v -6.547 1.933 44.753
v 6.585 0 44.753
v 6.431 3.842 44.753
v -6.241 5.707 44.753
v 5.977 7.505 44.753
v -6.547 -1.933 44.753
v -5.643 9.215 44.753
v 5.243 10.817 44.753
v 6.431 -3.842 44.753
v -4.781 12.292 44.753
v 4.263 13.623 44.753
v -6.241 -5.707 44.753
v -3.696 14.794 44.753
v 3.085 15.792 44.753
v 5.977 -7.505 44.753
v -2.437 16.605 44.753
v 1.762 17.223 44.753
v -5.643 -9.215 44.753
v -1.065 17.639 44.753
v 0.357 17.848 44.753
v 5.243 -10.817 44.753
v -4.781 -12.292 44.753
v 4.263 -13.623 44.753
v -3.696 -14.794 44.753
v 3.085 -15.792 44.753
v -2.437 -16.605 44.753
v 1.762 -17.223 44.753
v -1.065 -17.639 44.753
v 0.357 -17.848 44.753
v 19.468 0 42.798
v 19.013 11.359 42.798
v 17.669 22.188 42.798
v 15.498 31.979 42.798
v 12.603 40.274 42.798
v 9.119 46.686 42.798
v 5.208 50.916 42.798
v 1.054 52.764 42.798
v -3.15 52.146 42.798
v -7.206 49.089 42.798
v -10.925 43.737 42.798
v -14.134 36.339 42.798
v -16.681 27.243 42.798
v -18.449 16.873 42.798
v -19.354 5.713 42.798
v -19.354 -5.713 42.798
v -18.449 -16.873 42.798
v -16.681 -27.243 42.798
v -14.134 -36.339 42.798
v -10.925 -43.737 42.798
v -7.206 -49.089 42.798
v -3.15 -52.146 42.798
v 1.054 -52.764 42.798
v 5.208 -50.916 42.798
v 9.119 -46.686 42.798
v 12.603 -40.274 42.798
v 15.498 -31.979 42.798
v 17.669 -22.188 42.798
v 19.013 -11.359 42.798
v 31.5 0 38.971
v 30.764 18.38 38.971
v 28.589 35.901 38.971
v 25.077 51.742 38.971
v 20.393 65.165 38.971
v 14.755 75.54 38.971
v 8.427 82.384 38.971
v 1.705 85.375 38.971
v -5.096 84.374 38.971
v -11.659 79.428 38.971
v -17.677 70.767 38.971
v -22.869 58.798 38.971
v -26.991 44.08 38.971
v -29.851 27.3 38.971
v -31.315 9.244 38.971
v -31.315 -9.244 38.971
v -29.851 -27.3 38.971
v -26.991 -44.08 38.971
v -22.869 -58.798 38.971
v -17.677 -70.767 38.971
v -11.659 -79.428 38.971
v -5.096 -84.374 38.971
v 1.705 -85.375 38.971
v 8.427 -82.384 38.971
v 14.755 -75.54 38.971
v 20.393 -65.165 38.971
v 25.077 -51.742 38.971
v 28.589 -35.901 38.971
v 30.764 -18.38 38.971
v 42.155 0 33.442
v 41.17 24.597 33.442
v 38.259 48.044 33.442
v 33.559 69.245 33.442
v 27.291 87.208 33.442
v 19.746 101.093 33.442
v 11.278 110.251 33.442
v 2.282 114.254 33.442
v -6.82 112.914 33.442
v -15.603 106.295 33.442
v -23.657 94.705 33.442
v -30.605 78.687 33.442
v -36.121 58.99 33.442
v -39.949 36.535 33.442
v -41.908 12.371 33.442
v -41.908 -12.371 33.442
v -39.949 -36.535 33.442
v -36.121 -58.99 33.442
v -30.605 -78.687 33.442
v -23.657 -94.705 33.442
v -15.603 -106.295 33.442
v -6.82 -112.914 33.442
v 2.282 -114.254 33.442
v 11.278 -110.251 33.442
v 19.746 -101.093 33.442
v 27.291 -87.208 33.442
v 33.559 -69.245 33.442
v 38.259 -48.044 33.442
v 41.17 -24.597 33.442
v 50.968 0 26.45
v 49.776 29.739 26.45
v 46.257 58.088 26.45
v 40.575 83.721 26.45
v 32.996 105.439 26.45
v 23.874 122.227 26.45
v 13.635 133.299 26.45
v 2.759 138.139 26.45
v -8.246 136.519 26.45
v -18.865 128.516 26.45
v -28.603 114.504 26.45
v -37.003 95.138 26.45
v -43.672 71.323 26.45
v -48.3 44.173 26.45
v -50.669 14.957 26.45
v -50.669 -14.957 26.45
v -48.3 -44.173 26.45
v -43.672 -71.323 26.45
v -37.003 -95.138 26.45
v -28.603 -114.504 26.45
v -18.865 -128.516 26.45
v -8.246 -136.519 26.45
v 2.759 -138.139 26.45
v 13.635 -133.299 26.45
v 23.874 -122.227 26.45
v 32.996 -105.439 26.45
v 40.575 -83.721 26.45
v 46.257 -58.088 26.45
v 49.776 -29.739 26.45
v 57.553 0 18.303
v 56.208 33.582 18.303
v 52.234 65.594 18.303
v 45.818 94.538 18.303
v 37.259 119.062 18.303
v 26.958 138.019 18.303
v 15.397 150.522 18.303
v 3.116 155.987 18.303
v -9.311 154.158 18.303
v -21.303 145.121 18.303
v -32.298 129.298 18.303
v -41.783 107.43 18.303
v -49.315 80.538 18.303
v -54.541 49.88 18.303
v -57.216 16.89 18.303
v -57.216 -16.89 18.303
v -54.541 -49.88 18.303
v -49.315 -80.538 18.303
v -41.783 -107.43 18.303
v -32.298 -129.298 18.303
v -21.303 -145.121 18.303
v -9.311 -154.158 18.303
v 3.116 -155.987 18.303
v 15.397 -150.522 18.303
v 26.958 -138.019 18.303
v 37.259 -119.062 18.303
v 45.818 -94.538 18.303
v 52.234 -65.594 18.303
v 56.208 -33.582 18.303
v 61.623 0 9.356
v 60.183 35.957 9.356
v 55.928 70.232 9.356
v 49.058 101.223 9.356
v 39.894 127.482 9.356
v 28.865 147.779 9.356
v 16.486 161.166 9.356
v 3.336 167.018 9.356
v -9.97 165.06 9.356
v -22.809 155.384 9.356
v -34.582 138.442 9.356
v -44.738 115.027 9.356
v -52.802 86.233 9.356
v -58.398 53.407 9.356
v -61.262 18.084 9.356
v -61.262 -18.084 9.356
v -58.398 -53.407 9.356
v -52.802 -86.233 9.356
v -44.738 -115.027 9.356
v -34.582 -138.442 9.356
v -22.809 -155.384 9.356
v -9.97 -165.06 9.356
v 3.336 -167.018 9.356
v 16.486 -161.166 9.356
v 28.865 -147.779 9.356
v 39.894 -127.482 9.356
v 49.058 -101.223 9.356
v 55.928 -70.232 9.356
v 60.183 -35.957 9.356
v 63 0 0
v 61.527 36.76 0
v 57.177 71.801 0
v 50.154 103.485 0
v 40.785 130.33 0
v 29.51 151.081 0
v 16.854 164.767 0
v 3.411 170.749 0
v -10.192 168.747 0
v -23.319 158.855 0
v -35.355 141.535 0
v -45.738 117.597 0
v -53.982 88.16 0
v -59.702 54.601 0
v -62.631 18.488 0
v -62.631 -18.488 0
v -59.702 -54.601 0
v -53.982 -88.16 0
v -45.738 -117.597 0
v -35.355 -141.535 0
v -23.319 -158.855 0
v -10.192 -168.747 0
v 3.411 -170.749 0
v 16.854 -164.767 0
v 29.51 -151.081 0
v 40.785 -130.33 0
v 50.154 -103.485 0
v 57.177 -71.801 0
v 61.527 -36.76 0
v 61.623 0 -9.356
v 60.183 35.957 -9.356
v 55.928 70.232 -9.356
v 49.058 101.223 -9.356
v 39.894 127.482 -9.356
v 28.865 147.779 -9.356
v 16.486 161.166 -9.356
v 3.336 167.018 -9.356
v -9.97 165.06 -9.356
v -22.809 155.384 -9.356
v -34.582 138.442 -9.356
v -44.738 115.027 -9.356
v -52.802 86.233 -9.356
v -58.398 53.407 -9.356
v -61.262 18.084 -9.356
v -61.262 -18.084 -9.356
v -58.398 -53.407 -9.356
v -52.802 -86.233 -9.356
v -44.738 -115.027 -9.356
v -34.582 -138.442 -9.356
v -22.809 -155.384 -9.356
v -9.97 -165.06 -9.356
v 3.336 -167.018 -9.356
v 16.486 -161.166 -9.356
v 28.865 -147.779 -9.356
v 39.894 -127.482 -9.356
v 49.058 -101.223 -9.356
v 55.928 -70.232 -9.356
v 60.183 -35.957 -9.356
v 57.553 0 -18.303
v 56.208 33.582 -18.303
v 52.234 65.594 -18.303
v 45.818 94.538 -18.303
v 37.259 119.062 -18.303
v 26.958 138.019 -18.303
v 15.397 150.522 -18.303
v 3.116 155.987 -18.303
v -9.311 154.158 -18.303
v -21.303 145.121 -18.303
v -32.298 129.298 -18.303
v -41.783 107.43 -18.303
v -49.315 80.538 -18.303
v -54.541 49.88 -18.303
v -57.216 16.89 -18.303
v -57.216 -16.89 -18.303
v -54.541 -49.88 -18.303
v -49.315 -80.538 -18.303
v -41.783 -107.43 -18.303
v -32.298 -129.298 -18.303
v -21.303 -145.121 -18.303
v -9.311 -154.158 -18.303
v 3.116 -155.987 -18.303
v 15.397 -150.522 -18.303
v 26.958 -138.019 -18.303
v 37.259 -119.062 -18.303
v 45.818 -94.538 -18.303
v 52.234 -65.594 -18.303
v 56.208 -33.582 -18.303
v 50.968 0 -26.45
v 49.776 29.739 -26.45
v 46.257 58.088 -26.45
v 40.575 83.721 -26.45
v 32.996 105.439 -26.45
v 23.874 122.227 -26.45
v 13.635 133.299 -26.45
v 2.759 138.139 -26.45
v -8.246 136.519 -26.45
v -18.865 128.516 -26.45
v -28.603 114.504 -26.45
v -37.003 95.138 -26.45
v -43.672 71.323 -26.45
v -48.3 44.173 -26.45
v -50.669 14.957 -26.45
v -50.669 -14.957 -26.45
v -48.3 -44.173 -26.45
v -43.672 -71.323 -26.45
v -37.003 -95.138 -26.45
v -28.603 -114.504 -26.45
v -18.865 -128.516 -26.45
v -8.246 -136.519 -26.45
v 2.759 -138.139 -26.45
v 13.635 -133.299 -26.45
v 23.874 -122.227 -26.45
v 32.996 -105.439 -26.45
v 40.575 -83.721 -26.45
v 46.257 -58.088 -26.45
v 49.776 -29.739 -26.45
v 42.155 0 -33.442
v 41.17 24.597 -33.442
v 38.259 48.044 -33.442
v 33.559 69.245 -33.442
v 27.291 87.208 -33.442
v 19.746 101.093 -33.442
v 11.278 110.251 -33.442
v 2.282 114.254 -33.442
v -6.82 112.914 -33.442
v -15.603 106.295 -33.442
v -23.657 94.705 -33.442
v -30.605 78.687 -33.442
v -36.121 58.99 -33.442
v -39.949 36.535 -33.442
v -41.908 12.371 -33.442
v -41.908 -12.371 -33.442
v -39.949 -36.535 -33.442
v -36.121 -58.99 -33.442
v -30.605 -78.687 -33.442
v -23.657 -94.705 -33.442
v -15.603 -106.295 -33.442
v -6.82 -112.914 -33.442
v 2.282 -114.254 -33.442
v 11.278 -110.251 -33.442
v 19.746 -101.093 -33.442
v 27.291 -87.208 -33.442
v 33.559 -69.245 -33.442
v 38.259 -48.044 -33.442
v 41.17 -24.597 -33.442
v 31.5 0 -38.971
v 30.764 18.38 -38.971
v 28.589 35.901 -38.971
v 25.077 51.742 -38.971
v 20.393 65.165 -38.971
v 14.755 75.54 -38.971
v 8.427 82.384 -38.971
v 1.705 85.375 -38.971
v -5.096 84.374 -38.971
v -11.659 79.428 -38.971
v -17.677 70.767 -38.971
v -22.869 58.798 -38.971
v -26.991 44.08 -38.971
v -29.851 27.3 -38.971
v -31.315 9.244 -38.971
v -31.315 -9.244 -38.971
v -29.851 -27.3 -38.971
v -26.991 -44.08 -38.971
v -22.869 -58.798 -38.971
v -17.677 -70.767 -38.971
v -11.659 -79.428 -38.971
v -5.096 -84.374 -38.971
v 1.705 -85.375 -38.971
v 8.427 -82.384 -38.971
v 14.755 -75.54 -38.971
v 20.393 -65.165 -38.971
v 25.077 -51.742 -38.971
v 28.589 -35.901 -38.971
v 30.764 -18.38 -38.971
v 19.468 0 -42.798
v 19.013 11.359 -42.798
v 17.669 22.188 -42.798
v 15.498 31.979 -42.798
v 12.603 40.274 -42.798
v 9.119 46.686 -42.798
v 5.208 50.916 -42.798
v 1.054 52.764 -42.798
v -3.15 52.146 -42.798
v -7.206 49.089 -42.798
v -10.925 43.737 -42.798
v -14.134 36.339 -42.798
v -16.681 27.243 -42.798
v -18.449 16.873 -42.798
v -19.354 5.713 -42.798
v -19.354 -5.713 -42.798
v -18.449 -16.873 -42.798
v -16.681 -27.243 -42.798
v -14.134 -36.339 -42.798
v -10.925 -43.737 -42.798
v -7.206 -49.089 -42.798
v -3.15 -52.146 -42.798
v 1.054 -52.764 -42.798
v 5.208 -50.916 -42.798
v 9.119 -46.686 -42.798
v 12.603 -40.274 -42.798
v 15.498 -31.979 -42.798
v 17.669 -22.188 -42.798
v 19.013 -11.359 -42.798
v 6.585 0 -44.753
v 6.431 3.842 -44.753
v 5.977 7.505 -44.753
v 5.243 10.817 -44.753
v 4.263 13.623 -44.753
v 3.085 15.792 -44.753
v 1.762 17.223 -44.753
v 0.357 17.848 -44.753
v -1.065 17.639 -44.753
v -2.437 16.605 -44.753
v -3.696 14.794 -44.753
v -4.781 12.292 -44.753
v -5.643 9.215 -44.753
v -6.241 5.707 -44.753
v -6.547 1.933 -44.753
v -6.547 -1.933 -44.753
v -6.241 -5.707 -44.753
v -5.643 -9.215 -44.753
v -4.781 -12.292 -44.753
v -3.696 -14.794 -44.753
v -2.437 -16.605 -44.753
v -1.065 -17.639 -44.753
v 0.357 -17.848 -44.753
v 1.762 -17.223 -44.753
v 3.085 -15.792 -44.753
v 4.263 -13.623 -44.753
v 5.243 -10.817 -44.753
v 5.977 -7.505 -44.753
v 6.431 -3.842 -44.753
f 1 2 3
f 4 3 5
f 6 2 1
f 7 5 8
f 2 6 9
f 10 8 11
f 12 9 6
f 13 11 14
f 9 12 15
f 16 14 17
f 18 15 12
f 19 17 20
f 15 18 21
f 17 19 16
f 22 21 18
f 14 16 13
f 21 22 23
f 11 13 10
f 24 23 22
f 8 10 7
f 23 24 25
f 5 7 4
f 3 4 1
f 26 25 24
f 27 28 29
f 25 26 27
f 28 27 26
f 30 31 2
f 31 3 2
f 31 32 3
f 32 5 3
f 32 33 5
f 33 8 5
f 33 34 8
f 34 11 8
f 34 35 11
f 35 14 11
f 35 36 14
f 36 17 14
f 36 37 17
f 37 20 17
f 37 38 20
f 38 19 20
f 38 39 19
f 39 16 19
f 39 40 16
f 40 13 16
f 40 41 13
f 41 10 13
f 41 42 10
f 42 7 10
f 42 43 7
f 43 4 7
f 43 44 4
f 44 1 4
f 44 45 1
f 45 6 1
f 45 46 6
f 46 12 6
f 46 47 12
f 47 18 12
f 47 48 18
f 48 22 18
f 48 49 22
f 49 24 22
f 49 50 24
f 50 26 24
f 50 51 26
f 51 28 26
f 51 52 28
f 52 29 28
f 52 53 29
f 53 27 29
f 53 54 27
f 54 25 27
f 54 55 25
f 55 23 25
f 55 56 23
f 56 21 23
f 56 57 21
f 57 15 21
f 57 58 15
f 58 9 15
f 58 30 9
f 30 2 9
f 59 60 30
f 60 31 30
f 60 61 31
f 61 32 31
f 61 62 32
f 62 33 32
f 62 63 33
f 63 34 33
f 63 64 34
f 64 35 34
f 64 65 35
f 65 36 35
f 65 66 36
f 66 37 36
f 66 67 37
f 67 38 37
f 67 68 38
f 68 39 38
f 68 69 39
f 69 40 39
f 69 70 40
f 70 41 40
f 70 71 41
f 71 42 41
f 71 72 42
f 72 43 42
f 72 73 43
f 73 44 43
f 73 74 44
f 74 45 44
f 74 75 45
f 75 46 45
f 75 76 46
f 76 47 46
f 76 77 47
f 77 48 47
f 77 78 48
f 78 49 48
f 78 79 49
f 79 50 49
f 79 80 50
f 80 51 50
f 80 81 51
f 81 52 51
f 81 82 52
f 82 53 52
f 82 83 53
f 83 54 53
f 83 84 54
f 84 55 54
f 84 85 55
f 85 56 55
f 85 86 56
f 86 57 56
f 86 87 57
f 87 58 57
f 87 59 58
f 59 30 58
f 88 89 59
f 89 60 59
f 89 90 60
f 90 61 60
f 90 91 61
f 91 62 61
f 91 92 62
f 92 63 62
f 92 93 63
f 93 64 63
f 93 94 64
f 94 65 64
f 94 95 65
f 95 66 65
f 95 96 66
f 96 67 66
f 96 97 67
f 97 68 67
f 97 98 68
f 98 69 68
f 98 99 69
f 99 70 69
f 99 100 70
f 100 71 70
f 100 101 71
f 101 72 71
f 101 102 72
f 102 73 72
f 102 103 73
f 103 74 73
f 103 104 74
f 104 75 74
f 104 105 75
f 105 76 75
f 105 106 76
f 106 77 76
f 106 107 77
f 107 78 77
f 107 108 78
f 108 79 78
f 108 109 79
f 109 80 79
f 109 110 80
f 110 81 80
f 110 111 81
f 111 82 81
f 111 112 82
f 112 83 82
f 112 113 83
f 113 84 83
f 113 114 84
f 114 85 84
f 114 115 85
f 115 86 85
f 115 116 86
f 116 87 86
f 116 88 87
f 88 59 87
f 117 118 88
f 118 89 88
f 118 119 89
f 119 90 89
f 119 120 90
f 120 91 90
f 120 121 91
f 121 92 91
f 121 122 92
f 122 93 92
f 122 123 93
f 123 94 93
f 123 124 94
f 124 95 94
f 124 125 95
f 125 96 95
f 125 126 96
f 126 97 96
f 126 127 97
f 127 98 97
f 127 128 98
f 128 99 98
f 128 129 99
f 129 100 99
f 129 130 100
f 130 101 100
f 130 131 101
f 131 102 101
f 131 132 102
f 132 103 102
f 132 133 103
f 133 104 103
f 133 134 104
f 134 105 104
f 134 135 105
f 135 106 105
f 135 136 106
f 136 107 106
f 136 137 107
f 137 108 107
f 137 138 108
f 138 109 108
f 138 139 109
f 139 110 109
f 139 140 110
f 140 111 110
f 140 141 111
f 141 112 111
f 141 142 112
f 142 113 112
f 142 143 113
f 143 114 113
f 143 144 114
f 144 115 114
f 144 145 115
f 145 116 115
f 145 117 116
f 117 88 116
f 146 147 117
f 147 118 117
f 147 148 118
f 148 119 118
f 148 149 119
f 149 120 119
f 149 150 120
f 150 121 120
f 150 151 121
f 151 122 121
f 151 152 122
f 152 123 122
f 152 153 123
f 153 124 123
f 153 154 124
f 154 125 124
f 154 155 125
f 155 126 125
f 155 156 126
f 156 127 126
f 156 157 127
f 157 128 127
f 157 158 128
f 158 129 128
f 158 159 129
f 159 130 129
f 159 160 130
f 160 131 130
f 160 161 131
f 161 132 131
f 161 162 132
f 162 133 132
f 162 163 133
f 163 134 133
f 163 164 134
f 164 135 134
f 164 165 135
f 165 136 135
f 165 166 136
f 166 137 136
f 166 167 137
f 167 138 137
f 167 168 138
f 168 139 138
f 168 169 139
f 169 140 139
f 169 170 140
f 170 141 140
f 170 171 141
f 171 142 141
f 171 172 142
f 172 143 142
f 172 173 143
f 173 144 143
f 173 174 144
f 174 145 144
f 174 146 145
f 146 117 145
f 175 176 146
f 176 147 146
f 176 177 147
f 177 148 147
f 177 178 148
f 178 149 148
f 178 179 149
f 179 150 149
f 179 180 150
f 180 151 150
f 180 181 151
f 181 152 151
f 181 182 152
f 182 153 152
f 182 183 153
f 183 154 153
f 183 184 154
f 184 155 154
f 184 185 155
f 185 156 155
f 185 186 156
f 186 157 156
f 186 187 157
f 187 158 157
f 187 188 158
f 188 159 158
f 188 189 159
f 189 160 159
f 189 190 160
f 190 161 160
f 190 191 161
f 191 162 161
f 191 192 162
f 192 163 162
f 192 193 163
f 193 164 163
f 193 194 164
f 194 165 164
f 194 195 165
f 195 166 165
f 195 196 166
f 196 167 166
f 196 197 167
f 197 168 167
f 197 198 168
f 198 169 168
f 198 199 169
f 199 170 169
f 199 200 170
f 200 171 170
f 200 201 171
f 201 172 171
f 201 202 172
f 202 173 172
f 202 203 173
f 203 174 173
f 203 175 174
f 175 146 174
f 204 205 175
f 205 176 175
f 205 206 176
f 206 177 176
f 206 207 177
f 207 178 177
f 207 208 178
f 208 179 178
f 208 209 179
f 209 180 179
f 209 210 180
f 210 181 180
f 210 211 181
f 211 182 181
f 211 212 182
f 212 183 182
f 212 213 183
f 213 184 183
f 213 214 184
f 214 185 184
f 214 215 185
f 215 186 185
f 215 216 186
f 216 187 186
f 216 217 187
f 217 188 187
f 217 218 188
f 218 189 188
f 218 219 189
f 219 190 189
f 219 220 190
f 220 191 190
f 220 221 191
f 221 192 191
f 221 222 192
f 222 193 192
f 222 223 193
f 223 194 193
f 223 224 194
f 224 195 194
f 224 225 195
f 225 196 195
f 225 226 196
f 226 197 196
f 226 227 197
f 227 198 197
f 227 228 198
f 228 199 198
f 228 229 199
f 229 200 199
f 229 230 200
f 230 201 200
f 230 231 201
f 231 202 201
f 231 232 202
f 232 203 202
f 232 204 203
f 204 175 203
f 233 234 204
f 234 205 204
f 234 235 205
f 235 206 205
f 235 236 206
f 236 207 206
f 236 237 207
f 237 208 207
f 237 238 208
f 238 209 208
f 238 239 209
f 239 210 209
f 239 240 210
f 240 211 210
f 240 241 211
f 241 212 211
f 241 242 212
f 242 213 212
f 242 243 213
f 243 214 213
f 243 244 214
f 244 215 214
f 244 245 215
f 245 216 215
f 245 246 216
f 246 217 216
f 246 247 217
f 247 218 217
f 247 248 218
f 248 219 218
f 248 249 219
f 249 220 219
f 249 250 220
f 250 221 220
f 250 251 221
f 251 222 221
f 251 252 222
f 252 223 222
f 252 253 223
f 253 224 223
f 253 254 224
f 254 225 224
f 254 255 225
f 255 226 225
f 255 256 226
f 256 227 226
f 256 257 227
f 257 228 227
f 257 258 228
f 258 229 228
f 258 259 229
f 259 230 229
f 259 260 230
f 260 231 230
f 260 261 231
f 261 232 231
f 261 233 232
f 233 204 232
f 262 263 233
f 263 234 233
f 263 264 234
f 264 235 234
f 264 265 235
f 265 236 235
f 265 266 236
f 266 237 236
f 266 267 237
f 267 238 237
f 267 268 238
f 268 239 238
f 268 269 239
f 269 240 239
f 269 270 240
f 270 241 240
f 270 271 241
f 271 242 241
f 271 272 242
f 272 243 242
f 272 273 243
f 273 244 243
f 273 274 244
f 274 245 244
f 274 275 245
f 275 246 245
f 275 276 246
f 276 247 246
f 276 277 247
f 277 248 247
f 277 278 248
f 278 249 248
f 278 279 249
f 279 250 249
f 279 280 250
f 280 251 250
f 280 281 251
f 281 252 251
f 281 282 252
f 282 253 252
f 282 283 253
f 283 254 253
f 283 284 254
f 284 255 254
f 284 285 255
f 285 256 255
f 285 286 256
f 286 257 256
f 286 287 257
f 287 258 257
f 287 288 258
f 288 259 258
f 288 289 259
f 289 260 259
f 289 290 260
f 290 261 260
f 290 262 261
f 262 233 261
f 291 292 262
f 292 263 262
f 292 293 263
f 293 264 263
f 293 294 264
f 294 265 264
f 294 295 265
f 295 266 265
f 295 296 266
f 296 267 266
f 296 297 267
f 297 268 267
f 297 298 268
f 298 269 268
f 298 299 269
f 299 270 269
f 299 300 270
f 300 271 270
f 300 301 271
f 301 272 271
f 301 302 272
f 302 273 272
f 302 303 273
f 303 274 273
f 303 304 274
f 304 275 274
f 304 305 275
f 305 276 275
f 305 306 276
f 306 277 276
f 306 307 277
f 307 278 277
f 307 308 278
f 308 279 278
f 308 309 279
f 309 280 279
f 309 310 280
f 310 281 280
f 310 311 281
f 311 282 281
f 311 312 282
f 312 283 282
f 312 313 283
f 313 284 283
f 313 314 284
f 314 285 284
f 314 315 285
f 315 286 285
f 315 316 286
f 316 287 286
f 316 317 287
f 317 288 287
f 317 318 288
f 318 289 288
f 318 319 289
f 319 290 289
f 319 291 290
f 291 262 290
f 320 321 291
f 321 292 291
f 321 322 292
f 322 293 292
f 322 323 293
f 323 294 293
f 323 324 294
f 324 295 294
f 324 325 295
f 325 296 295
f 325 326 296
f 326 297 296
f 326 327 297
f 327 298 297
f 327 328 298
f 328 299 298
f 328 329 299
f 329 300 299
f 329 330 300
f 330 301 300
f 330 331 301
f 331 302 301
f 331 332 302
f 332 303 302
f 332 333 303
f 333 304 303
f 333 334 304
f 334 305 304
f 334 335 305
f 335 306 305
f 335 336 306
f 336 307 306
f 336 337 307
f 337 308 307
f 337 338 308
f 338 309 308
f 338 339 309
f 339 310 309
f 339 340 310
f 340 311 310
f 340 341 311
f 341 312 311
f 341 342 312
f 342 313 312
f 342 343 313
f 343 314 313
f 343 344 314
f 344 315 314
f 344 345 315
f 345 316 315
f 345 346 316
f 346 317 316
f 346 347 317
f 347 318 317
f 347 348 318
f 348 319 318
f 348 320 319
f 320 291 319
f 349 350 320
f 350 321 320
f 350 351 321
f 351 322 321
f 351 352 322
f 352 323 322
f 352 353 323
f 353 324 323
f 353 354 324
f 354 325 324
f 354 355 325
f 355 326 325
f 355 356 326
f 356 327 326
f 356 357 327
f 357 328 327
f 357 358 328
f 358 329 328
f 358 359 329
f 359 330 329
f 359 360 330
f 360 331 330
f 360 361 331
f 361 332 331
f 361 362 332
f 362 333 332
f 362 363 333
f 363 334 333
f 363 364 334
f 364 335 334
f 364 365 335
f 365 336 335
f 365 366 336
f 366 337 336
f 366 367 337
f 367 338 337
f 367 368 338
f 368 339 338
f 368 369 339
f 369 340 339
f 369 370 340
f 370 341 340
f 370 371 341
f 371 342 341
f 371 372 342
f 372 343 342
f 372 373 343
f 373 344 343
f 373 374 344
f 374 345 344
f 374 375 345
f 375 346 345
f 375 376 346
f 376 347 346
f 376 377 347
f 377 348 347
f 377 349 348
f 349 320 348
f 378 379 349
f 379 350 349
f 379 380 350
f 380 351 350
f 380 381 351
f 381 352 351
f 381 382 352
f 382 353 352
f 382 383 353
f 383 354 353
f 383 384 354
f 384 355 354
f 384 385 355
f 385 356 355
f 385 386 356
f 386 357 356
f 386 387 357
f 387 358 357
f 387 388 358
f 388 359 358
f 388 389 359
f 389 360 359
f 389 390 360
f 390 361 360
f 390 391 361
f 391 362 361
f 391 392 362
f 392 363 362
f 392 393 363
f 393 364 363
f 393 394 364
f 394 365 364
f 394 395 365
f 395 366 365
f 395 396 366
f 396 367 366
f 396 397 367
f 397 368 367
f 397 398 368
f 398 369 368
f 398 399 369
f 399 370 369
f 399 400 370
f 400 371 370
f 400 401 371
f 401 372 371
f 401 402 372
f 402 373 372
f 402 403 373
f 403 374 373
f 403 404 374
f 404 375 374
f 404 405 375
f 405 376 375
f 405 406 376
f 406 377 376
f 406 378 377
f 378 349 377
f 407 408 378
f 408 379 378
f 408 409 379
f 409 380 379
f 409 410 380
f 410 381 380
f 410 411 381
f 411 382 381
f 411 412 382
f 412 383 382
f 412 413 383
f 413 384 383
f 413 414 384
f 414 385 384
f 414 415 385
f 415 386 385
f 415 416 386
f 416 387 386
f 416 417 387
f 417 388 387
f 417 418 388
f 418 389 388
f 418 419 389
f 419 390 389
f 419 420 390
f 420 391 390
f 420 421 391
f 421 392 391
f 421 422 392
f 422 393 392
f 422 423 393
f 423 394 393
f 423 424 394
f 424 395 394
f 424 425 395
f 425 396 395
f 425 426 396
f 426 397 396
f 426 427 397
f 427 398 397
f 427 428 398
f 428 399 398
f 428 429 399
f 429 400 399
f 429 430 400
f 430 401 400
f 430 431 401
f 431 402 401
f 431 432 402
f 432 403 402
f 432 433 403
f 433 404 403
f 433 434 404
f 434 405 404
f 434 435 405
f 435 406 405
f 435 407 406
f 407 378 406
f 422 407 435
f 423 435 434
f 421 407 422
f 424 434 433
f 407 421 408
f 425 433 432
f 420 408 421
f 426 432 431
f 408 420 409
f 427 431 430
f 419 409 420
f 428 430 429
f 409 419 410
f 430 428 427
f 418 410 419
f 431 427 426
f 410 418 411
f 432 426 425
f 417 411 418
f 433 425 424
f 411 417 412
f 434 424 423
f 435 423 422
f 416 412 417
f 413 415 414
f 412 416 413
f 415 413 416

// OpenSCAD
// Generated by SolidPython 1.0.1 on 2020-07-29 00:46:48


scale(v = [7, 19, 5]) {
	sphere(r = 9);
}
/***********************************************
*********      SolidPython code:      **********
************************************************
 
# import packages: SolidPython
from solid import *
from solid.utils import *
from itertools import chain, combinations, permutations


class Resize:

    def __init__(self, scad_file):
        self.scad_file = scad_file
        #self.scad_file = import_scad(scad_file)
        # cone/cylinder param:
        self.r1 = 0
        self.r2 = 0
        self.h = 0
        # rectangular prism param:
        self.w = 0
        self.l = 0
        # ellipse param:
        self.r = 0

    # import OpenScad code (file name corresponds to shape)


    # classify shape + parameters
    def assign(self, param1, param2, param3):
        if self.scad_file == 'cone.scad':
            self.r1 = param1
            self.r2 = param2
            self.h = param3
        elif self.scad_file == 'cylinder.scad':
            self.r1 = param1
            self.r2 = param2
            self.h = param3
        elif self.scad_file == 'rectangularPrism.scad':
            self.h = param1
            self.l = param2
            self.w = param3
        else:
            self.r = param1
            self.h = param2

    # resize parameters
    def iterate(self):
        x = range(3, 20, 2)
        i = 1
        if self.scad_file == 'cone.scad':
            tempList = list(permutations(x, 2))
            for temp in tempList:
                param1 = temp[0]
                param2 = temp[1]
                filepath = 'produced_scad_files/' + 'cone' + str(param1) + '_' + str(param2) + '_' + '.scad'
                scad_render_to_file(cylinder(h=param1, r1=param2, r2=0), filepath)

        elif self.scad_file == 'cylinder.scad':
            tempList = list(permutations(x, 3))
            for temp in tempList:
                param1 = temp[0]
                param2 = temp[1]
                filepath = 'produced_scad_files/' + 'cylinder' + str(param1) + '_' + str(param2) + '_' + '.scad'
                scad_render_to_file(cylinder(h=param1, r1=param2, r2=param2), filepath)

        elif self.scad_file == 'rectangularPrism.scad':
            tempList = list(permutations(x, 3))
            for temp in tempList:
                param1 = temp[0]
                param2 = temp[1]
                param3 = temp[2]
                filepath = 'produced_scad_files/' + 'rectangularPrism' + str(param1) + '_' + str(param2) + '_' + str(
                    param3) + '.scad'
                scad_render_to_file(cube(size=(param1, param2, param3)), filepath)

        elif self.scad_file == 'ellipse.scad':
            tempList = list(permutations(x, 4))
            for temp in tempList:
                param1 = temp[0]
                param2 = temp[1]
                param3 = temp[2]
                param4 = temp[3]
                filepath = 'produced_scad_files/' + 'ellipse' + str(param1) + '_' + str(param2) + '_' + str(param3) + '_' + str(param4) + '.scad'
                scad_render_to_file(scale([param1, param2, param3])(sphere(r=param4)), filepath)

    def render_to_scadfile(self):
        scad_render_to_file(scad, 'example.scad') 
 
************************************************/
